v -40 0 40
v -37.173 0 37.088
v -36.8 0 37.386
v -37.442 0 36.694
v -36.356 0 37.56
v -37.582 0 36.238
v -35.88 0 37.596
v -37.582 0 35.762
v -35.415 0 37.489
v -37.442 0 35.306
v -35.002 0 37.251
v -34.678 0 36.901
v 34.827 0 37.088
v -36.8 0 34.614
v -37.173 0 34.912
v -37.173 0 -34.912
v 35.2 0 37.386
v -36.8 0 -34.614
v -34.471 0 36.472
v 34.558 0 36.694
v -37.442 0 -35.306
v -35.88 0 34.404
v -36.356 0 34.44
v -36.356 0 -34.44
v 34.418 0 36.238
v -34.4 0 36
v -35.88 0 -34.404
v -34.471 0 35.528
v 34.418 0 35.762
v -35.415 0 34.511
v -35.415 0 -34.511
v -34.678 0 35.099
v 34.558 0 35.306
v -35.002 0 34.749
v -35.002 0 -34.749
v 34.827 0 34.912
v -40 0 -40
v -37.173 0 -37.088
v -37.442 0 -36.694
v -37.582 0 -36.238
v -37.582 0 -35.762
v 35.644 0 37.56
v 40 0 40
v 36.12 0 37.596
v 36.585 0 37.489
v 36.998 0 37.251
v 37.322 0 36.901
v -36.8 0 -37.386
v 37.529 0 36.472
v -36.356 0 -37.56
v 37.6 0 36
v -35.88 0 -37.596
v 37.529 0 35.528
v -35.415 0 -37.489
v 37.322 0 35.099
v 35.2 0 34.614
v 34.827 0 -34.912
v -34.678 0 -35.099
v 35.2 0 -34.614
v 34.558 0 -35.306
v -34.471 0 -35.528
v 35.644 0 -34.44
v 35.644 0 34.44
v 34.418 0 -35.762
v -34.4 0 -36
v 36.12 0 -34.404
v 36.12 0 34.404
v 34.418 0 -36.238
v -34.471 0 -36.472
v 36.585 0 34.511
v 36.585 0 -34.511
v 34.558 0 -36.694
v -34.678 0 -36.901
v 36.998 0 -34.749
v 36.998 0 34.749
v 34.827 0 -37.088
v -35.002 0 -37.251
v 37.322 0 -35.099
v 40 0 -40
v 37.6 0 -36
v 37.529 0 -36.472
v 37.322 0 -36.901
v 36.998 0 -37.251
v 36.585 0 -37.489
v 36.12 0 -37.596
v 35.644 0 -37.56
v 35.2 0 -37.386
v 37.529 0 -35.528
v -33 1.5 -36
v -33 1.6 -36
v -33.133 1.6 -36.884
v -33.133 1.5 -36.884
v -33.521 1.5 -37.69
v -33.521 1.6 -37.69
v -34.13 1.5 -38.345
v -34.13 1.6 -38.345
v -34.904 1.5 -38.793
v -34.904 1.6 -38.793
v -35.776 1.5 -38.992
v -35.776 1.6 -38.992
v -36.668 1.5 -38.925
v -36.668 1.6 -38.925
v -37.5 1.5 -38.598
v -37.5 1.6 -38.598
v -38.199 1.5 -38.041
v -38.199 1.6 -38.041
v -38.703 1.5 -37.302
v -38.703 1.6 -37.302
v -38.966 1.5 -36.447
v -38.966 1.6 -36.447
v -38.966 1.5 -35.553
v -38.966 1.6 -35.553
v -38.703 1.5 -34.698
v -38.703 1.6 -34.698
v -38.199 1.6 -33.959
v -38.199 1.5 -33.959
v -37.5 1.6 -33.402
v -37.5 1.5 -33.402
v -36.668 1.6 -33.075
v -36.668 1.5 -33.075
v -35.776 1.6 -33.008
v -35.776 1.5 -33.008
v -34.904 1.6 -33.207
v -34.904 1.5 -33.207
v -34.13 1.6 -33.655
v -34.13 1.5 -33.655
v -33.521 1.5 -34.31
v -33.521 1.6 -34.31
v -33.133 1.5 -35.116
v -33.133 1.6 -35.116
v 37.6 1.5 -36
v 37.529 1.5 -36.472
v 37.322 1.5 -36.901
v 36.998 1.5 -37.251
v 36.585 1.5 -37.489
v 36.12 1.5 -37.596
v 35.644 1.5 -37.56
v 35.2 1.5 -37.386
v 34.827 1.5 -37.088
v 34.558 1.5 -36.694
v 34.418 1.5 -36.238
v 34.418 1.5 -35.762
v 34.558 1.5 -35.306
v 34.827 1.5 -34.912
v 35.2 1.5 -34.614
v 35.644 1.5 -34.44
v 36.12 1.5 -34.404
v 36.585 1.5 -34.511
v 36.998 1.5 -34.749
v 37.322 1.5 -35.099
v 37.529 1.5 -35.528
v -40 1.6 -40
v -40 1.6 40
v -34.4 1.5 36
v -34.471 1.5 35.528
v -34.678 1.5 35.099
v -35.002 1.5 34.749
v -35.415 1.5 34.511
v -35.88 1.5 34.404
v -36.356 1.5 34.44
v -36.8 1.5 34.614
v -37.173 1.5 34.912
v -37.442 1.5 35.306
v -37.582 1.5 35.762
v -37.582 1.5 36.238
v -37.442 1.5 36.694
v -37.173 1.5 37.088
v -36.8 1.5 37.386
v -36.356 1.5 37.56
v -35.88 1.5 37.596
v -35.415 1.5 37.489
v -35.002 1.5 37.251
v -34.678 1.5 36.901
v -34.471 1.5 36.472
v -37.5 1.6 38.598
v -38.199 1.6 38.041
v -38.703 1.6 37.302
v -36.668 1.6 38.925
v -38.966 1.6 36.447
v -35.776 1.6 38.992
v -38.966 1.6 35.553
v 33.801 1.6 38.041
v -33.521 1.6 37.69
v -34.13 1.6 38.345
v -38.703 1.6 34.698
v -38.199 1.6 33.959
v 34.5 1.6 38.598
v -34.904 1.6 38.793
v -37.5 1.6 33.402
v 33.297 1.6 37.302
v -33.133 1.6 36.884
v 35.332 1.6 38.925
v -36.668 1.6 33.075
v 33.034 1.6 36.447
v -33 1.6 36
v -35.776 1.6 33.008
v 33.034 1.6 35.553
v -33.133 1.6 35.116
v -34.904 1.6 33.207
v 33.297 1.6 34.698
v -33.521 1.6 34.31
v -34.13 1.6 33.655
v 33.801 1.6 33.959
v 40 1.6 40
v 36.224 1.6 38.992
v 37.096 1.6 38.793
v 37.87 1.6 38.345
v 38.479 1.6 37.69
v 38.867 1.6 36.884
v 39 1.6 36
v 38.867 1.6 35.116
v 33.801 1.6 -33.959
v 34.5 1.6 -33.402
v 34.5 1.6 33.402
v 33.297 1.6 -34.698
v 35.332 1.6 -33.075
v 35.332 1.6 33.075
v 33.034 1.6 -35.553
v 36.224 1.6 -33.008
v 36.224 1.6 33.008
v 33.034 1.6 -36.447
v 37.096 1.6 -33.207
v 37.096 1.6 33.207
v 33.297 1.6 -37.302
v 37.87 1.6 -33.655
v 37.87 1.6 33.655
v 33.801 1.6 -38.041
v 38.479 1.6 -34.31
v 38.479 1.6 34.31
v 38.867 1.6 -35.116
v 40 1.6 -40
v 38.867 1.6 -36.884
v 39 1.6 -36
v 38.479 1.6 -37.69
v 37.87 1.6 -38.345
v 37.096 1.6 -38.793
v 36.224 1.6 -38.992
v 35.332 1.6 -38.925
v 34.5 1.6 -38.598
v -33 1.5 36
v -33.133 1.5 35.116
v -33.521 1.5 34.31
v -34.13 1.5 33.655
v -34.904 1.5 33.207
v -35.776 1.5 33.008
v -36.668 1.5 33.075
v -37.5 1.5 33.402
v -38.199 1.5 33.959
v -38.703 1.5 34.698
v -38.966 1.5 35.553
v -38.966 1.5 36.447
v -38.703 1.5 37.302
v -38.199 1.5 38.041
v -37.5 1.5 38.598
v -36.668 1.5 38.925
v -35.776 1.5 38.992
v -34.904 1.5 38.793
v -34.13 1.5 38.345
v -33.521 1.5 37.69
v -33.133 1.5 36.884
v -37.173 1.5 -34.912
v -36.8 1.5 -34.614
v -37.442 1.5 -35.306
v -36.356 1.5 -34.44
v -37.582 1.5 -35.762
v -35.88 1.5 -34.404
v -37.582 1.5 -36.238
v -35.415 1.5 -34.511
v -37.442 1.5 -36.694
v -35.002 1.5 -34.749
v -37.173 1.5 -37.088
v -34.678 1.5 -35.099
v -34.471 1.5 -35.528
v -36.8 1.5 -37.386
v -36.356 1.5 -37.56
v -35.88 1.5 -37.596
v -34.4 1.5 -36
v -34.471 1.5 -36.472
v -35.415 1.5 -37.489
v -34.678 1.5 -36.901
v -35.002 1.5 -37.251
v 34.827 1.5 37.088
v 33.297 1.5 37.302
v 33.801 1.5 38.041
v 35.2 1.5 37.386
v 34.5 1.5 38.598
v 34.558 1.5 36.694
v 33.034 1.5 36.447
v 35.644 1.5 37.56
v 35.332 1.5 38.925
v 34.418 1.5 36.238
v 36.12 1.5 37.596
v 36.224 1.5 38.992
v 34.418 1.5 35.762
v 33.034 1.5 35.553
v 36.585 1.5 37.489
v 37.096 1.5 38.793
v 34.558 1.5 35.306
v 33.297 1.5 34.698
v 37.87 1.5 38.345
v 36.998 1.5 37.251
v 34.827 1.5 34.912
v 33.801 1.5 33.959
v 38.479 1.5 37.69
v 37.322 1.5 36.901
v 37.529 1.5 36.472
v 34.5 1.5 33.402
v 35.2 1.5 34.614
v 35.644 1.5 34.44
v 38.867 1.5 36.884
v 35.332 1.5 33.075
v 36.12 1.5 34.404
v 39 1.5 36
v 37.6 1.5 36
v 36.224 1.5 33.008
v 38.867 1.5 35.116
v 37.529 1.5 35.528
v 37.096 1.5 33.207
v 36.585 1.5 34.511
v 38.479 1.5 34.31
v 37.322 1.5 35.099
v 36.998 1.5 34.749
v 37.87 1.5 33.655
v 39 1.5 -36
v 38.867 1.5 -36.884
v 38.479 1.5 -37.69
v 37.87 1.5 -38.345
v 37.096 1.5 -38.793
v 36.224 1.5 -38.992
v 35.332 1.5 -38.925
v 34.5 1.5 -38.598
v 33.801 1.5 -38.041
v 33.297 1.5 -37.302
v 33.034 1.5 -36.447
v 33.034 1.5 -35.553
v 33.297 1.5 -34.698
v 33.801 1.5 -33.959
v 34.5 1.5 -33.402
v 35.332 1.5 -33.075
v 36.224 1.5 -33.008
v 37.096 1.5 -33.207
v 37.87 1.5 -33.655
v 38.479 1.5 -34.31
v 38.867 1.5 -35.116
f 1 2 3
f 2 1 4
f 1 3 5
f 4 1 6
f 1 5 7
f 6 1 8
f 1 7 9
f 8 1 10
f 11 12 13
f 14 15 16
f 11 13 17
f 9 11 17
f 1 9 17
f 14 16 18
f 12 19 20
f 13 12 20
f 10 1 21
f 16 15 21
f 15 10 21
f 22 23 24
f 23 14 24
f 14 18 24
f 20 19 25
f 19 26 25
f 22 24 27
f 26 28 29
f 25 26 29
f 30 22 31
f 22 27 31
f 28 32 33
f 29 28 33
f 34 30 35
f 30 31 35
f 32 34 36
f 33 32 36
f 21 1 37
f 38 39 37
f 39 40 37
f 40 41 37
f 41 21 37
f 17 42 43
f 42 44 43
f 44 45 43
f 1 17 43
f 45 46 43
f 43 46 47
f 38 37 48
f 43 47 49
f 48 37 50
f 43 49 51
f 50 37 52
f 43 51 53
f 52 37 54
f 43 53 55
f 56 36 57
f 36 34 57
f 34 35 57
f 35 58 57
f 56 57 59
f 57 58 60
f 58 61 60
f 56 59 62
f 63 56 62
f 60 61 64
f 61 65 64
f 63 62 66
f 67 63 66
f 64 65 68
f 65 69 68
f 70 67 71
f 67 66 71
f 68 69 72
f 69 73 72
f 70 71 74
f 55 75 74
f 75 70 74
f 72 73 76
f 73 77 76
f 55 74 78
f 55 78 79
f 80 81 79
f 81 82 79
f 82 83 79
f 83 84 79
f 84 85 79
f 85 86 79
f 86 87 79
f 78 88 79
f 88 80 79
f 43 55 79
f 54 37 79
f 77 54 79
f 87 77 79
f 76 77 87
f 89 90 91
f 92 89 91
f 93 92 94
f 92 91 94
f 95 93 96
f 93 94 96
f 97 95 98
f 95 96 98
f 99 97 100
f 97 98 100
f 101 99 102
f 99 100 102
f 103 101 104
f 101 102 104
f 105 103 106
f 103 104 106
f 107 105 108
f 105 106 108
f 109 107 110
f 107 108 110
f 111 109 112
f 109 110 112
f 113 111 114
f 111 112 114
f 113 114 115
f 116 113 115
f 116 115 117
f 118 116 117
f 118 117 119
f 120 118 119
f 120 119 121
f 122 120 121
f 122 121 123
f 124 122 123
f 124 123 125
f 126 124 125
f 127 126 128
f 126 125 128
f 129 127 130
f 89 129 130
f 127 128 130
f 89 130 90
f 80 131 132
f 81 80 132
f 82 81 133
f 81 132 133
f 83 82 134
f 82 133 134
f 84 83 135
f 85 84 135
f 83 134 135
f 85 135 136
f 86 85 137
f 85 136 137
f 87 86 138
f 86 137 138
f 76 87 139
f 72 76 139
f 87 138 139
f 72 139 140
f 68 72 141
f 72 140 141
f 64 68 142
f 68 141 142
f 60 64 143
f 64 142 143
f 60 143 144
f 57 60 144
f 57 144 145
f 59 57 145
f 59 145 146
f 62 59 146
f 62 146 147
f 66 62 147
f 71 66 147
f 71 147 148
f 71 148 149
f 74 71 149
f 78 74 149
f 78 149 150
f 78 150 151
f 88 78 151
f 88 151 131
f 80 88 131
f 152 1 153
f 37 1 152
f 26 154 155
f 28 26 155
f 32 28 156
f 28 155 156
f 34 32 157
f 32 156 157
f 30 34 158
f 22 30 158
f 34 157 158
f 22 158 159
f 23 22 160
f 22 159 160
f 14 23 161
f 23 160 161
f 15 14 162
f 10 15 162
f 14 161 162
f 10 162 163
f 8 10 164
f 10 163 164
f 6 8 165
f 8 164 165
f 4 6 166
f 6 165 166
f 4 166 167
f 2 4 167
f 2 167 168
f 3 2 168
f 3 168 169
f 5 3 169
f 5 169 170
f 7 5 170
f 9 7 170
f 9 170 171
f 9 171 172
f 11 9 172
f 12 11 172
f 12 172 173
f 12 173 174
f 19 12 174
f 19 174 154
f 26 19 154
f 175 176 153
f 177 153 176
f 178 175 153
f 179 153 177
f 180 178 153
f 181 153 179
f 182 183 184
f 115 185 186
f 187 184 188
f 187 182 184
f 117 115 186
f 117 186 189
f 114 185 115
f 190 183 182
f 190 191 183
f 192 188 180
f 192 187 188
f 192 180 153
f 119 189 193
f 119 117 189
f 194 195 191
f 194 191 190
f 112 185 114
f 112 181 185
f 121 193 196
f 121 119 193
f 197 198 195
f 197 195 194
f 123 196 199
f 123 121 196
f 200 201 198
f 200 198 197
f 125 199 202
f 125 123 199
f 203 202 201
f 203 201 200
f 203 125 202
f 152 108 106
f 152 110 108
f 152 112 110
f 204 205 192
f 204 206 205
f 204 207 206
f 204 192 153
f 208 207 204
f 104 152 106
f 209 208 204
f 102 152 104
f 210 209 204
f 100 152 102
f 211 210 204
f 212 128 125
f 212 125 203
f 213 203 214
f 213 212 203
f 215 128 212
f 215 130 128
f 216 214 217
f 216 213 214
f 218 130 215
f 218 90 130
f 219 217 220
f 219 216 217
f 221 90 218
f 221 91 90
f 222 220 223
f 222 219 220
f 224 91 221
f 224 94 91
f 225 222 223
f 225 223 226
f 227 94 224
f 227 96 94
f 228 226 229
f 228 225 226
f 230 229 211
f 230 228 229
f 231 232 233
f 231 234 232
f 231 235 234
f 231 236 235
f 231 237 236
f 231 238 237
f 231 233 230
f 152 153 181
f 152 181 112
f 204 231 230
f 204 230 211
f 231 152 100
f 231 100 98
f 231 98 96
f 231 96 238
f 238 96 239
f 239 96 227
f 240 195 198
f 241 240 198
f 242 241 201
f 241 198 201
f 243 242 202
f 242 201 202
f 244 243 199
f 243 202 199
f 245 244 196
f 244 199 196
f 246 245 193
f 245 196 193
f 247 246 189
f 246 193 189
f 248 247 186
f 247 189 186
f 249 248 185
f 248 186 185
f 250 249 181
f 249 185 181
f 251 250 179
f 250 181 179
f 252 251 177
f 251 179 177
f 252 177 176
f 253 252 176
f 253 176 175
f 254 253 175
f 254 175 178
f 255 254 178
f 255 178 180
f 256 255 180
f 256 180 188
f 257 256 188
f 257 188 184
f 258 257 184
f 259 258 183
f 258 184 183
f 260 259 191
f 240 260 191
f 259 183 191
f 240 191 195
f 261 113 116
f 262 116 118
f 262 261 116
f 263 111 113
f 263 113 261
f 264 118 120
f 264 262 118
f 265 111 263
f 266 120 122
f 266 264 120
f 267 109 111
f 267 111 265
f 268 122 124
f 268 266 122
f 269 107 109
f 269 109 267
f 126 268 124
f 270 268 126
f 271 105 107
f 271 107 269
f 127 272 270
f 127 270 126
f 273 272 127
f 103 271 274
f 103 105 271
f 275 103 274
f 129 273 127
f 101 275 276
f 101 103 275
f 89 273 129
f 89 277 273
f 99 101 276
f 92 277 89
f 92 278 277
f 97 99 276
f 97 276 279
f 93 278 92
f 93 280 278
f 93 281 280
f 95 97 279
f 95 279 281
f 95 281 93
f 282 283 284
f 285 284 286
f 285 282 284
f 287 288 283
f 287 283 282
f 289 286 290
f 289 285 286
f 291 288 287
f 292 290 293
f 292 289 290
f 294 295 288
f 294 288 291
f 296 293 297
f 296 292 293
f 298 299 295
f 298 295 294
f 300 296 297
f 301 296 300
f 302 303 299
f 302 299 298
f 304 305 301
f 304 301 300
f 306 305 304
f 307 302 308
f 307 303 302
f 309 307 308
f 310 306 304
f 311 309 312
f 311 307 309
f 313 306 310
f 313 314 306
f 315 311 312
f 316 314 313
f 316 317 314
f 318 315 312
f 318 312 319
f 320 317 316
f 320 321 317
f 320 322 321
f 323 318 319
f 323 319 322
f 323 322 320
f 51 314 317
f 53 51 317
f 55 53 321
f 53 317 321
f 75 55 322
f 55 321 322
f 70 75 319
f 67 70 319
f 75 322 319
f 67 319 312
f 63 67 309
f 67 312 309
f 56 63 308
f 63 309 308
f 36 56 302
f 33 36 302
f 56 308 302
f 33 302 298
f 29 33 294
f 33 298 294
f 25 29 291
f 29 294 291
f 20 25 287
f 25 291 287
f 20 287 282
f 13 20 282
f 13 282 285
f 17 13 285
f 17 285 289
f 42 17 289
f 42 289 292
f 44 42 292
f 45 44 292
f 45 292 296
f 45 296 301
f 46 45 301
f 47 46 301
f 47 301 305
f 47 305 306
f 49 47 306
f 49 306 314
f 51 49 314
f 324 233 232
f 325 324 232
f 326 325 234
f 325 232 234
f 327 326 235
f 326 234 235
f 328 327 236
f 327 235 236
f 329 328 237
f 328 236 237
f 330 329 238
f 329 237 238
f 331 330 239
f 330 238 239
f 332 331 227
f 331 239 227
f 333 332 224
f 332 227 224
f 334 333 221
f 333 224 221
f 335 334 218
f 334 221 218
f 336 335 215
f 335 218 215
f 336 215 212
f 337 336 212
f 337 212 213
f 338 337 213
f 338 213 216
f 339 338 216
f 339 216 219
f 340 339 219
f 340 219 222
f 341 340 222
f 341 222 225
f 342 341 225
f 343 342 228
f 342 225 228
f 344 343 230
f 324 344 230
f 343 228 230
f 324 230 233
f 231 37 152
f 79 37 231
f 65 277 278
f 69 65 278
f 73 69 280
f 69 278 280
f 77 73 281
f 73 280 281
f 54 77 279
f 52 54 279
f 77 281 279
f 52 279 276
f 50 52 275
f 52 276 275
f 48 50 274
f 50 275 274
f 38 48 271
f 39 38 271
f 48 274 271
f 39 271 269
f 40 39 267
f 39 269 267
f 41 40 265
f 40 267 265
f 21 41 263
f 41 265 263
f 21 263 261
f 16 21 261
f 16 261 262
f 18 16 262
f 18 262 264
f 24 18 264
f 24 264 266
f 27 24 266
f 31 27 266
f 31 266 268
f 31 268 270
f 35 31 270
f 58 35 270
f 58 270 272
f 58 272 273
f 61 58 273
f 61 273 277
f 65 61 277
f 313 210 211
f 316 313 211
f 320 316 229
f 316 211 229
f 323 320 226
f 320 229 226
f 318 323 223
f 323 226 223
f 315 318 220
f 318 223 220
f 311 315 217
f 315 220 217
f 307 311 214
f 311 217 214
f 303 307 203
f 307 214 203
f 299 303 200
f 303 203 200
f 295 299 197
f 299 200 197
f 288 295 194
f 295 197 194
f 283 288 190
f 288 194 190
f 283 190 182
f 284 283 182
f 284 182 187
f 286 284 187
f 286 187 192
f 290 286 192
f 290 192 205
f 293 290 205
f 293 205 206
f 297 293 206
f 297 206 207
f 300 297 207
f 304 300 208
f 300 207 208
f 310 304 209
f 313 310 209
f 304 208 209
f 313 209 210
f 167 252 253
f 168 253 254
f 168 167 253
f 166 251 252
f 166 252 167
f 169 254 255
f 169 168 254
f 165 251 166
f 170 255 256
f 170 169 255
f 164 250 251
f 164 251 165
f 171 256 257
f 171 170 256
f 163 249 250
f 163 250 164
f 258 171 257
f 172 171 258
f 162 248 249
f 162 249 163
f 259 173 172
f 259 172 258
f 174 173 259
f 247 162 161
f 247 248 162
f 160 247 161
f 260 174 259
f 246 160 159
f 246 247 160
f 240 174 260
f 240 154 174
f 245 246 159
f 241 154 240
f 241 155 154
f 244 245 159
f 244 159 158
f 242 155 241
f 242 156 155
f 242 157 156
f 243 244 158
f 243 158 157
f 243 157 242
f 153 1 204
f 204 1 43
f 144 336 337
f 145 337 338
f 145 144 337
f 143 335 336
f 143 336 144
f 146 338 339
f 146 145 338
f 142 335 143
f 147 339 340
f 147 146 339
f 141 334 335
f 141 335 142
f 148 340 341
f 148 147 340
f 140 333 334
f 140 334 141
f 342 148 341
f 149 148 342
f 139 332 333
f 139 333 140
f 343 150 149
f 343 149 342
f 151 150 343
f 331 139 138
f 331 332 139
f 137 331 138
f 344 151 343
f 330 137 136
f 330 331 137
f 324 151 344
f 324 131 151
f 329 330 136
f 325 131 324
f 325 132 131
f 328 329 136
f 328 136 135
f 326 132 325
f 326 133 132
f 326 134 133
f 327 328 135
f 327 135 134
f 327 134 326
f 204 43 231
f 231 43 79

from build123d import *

# Parameters (mm, degrees)
SKETCH1_W           = 80
SKETCH1_H           = 80
BOSS_EXTRUDE1_DEPTH = 1.6
SKETCH5_R           = 3
CUT_EXTRUDE1_DEPTH  = 0.1
SKETCH6_R           = 1.6
CUT_EXTRUDE2_DEPTH  = 1.6


with BuildPart() as part:
    # Sketch1 → Boss-Extrude1 (new body)
    with BuildSketch(Plane(origin=(0, 0, 0), x_dir=(1, 0, 0), z_dir=(0, 1, 0))):
        Rectangle(SKETCH1_W, SKETCH1_H)
    extrude(amount=BOSS_EXTRUDE1_DEPTH)

    # Sketch5 → Cut-Extrude1 (cut)
    with BuildSketch(Plane(origin=(0, 1.6, 0), x_dir=(1, 0, 0), z_dir=(0, 1, 0))):
        with Locations((-36, 36)):
            Circle(SKETCH5_R)
        with Locations((36, 36)):
            Circle(SKETCH5_R)
        with Locations((36, -36)):
            Circle(SKETCH5_R)
        with Locations((-36, -36)):
            Circle(SKETCH5_R)
    extrude(amount=-CUT_EXTRUDE1_DEPTH, mode=Mode.SUBTRACT)

    # Sketch6 → Cut-Extrude2 (cut)
    with BuildSketch(Plane(origin=(0, 1.6, 0), x_dir=(1, 0, 0), z_dir=(0, 1, 0))):
        with Locations((-36, 36)):
            Circle(SKETCH6_R)
        with Locations((36, 36)):
            Circle(SKETCH6_R)
        with Locations((36, -36)):
            Circle(SKETCH6_R)
        with Locations((-36, -36)):
            Circle(SKETCH6_R)
    extrude(amount=-CUT_EXTRUDE2_DEPTH, mode=Mode.SUBTRACT)


solid = part.part
